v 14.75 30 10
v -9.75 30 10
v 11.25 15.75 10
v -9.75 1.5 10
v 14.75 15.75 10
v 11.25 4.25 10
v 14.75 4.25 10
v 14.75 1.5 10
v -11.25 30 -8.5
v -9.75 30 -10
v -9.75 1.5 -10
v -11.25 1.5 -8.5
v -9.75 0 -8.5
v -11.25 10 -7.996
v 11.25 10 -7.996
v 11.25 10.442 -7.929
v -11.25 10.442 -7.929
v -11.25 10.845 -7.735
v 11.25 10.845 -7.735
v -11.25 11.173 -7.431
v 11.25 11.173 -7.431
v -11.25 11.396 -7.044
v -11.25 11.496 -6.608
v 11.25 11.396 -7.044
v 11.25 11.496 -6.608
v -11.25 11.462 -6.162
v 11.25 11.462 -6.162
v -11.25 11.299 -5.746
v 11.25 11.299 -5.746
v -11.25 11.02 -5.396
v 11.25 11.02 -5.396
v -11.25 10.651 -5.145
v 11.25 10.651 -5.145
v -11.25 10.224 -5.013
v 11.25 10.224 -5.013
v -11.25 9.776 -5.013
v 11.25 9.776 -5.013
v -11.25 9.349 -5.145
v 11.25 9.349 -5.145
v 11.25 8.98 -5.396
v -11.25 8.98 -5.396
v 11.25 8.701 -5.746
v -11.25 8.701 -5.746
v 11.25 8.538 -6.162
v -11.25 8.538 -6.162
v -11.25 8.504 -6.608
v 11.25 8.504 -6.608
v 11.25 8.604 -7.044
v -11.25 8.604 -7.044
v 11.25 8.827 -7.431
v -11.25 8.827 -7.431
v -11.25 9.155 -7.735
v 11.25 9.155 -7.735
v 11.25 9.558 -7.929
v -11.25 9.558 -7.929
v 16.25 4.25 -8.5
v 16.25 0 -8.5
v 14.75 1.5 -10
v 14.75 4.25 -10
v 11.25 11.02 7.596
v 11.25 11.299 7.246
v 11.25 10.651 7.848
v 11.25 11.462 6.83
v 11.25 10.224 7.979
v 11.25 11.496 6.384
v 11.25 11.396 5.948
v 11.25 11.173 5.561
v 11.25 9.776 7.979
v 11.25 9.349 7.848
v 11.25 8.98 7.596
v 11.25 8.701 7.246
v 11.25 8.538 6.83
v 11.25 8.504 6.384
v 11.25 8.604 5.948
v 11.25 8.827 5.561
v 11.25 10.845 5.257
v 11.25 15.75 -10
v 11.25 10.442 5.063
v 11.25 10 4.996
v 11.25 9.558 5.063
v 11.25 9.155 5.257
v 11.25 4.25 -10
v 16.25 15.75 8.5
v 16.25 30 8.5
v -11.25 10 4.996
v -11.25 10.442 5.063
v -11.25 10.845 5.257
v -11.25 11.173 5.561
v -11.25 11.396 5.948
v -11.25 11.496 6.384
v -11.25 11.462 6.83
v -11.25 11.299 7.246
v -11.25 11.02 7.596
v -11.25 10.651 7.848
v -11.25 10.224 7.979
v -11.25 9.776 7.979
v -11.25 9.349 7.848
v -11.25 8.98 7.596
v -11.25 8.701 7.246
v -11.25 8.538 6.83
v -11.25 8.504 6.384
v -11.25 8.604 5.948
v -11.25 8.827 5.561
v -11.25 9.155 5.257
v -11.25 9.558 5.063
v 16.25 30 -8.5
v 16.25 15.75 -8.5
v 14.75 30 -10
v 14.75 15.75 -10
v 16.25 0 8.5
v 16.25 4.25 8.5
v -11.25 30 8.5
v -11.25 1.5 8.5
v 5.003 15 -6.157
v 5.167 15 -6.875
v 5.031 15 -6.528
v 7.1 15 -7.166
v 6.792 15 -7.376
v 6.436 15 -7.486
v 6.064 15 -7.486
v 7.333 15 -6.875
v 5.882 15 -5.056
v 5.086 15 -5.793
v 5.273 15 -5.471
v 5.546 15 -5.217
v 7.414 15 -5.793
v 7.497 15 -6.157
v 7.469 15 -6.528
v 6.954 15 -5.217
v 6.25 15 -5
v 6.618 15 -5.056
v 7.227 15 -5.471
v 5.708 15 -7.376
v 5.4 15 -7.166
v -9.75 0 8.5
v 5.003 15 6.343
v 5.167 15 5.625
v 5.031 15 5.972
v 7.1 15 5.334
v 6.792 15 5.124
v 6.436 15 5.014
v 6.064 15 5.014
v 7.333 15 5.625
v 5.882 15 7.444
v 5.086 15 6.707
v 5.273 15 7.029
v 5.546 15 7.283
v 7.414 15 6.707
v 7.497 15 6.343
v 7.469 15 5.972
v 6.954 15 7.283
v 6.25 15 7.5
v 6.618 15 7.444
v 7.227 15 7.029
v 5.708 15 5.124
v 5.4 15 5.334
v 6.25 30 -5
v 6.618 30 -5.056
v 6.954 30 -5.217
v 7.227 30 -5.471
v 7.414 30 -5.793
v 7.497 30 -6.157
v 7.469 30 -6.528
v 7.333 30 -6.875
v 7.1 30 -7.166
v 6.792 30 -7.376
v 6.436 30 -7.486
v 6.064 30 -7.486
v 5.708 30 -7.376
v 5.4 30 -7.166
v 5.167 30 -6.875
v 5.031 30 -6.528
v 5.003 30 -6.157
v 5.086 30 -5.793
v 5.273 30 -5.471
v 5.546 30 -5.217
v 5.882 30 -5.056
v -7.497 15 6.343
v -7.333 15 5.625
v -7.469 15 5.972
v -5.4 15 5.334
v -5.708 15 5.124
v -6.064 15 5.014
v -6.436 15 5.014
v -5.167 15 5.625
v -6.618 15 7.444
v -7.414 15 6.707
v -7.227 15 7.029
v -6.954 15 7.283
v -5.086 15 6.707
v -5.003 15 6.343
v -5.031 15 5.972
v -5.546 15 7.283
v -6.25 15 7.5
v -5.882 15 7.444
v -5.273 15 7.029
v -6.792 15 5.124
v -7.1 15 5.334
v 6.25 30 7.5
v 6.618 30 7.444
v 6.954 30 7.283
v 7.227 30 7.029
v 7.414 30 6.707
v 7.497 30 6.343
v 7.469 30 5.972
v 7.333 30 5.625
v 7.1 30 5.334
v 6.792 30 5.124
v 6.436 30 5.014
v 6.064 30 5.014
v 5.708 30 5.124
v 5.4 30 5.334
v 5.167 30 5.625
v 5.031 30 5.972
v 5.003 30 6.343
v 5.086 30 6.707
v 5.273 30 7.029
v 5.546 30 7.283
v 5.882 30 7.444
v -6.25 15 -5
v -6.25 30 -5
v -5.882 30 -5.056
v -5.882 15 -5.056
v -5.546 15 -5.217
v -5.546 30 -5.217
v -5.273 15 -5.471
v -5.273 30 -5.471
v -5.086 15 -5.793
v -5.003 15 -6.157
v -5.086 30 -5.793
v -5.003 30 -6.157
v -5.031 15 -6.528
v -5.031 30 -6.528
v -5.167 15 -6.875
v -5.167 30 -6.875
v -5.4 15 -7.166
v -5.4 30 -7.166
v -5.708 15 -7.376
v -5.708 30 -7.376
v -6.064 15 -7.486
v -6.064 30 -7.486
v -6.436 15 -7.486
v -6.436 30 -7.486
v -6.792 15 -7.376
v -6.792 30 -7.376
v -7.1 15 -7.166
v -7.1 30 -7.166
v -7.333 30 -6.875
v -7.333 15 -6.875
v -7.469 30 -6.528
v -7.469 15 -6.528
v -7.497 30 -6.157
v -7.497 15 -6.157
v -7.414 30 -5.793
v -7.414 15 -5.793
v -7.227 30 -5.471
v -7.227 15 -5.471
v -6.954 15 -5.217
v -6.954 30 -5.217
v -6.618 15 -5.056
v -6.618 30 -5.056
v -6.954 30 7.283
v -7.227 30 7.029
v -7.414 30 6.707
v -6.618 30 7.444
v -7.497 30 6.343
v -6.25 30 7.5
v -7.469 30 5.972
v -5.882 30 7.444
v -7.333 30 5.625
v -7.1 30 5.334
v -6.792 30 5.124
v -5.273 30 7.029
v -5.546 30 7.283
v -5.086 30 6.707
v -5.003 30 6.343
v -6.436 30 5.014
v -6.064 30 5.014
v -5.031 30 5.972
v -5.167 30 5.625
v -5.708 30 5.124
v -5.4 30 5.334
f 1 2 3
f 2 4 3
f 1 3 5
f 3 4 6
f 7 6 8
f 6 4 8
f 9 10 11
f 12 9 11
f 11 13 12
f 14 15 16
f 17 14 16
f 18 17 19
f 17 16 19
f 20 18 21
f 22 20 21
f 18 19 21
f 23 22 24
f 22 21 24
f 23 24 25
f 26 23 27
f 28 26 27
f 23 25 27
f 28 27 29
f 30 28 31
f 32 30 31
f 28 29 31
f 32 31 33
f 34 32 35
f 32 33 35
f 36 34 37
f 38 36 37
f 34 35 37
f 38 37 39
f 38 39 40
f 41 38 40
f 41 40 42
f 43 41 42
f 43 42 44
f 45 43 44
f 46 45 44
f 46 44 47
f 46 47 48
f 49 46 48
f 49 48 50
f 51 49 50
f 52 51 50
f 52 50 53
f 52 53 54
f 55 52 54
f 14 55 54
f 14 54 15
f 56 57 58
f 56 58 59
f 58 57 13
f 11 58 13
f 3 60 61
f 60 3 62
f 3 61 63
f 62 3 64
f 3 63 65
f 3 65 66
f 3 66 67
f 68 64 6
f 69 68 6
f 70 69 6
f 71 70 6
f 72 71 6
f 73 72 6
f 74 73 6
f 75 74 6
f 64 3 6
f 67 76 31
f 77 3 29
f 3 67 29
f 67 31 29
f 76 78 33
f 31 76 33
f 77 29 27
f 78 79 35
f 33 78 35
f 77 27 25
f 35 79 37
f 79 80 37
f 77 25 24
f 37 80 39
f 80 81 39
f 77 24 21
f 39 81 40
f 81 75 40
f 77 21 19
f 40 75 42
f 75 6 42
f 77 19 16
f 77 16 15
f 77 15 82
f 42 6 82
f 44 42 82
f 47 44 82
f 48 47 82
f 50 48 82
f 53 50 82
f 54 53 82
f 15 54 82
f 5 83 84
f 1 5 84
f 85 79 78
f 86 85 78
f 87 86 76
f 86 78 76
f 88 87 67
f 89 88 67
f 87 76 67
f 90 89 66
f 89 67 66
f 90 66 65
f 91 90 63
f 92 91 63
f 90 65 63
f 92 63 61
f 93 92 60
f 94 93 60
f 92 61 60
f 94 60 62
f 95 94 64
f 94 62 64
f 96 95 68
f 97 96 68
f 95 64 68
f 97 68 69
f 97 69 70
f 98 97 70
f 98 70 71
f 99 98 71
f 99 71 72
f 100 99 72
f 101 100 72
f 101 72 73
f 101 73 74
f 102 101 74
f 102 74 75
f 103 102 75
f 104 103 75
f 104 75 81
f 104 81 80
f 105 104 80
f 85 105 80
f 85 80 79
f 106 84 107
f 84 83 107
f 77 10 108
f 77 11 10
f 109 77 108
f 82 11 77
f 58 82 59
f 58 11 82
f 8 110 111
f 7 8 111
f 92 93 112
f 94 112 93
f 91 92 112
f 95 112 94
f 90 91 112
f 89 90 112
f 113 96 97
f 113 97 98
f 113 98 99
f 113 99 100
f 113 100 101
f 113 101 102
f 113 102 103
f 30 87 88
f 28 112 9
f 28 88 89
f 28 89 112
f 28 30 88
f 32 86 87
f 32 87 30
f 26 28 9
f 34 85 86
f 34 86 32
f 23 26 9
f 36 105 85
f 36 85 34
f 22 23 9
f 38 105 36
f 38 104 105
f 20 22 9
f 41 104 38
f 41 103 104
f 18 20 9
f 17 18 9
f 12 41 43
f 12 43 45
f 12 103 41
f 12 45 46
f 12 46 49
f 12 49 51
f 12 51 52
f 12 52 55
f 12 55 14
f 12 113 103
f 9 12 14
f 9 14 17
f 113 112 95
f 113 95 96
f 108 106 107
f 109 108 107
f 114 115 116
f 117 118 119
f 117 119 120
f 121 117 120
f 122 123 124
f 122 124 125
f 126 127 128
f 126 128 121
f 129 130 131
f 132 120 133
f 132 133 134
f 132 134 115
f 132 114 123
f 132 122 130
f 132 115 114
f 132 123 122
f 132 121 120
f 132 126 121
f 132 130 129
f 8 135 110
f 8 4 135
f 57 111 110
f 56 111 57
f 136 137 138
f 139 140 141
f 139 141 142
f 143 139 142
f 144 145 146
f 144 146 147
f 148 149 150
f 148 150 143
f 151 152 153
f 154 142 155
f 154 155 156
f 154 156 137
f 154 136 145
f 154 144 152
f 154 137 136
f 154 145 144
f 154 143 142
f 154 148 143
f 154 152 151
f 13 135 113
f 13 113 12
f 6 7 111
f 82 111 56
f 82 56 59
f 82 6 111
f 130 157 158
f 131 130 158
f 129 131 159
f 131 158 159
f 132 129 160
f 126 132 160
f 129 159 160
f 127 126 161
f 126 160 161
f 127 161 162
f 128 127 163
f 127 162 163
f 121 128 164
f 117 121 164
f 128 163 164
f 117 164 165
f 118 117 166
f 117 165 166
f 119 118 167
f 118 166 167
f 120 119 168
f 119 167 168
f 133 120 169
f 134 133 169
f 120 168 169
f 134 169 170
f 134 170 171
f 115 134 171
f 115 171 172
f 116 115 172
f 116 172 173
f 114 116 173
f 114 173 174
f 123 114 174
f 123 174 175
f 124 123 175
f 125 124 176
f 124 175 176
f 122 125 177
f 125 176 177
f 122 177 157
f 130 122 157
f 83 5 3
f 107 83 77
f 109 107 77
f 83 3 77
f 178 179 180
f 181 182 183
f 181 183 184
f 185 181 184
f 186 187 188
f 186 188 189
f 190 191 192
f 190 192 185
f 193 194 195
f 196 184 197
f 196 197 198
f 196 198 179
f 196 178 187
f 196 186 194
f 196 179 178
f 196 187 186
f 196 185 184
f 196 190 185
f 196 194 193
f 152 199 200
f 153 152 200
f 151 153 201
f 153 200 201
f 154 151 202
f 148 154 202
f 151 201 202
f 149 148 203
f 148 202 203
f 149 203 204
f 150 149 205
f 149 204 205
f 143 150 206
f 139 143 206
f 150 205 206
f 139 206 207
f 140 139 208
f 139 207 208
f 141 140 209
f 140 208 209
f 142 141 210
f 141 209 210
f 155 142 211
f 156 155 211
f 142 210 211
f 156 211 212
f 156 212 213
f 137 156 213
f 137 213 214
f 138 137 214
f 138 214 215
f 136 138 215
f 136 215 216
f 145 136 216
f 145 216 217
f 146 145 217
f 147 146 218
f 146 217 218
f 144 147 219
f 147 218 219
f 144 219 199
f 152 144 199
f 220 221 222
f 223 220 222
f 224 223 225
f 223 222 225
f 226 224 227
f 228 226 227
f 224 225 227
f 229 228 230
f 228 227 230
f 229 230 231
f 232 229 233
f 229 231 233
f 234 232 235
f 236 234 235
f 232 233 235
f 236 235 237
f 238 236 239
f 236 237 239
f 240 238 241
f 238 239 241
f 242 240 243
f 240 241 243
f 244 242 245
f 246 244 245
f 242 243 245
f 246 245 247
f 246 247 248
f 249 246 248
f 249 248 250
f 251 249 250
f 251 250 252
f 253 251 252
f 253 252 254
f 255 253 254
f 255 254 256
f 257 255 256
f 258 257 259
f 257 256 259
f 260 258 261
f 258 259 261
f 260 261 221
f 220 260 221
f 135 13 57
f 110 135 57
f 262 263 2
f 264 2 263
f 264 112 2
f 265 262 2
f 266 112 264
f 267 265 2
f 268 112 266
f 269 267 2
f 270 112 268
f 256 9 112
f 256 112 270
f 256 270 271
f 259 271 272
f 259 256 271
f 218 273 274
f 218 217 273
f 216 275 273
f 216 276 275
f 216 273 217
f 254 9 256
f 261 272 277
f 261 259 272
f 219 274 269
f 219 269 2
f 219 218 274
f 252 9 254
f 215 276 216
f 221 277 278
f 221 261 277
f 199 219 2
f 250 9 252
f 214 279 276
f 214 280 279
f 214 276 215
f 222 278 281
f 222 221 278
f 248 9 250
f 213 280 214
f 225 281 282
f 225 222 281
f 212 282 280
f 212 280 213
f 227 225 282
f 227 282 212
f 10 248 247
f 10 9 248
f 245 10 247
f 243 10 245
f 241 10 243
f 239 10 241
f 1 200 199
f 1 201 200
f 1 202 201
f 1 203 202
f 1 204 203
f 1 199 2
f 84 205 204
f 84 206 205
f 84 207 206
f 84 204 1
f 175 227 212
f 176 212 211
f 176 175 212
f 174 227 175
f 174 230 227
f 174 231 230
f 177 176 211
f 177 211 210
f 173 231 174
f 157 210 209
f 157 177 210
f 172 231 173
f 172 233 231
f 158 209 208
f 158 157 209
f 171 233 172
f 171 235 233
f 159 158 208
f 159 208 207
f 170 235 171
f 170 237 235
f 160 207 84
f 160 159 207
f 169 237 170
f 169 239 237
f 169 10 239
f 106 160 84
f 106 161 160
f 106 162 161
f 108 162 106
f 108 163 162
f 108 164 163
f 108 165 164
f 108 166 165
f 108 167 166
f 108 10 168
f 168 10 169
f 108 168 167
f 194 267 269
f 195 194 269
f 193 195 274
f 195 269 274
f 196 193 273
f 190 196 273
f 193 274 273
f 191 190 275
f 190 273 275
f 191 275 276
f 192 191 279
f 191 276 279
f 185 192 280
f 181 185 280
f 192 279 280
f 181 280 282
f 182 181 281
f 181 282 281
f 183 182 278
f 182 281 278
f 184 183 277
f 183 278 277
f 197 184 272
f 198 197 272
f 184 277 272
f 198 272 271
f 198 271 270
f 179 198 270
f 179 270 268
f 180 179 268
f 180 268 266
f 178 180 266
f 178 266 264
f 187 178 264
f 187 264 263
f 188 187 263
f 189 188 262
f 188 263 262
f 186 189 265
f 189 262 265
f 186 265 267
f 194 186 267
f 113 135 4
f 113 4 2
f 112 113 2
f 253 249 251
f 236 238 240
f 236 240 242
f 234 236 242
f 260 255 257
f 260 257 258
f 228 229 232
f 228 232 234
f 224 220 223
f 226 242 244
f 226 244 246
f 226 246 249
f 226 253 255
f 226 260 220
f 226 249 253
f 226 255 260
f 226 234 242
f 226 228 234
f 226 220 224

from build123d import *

# Parameters (mm, degrees)
SKETCH_1_W          = 22.5
SKETCH_1_H          = 20
EXTRUDE_1_DEPTH     = 20
SKETCH_2_W          = 20
SKETCH_2_H          = 4.25
EXTRUDE_2_DEPTH     = 5
SKETCH_3_R          = 1.5
CUT_EXTRUDE_1_DEPTH = 32.721443851
SKETCH_4_W          = 27.5
SKETCH_4_H          = 20
EXTRUDE_3_DEPTH     = 10
SKETCH_5_R          = 1.25
CUT_EXTRUDE_2_DEPTH = 15
CHAMFER_1_SIZE      = 1.5


with BuildPart() as part:
    # 草图1 → 凸台-拉伸1 (new body)
    with BuildSketch(Plane(origin=(0, 0, 0), x_dir=(1, 0, 0), z_dir=(0, 1, 0))):
        Rectangle(SKETCH_1_W, SKETCH_1_H)
    extrude(amount=EXTRUDE_1_DEPTH)

    # 草图2 → 凸台-拉伸2 (add)
    with BuildSketch(Plane(origin=(11.25, 0, 0), x_dir=(0, 0, -1), z_dir=(1, 0, 0))):
        with Locations((0, 17.875)):
            Rectangle(SKETCH_2_W, SKETCH_2_H)
        with Locations((0, 2.125)):
            Rectangle(SKETCH_2_W, SKETCH_2_H)
    extrude(amount=EXTRUDE_2_DEPTH)

    # 草图3 → 切除-拉伸1 (cut, through all)
    with BuildSketch(Plane(origin=(11.25, 0, 0), x_dir=(0, 0, -1), z_dir=(1, 0, 0))):
        with Locations((6.496047989, 10)):
            Circle(SKETCH_3_R)
        with Locations((-6.496047989, 10)):
            Circle(SKETCH_3_R)
    extrude(amount=-CUT_EXTRUDE_1_DEPTH, mode=Mode.SUBTRACT)

    # 草图4 → 凸台-拉伸3 (add)
    with BuildSketch(Plane(origin=(0, 20, 0), x_dir=(1, 0, 0), z_dir=(0, 1, 0))):
        with Locations((2.5, 0)):
            Rectangle(SKETCH_4_W, SKETCH_4_H)
    extrude(amount=EXTRUDE_3_DEPTH)

    # 草图5 → 切除-拉伸2 (cut)
    with BuildSketch(Plane(origin=(0, 30, 0), x_dir=(1, 0, 0), z_dir=(0, 1, 0))):
        with Locations(Location((6.25, 6.25, 0), (0, 0, 270))):
            Circle(SKETCH_5_R)
        with Locations(Location((6.25, -6.25, 0), (0, 0, 270))):
            Circle(SKETCH_5_R)
        with Locations(Location((-6.25, 6.25, 0), (0, 0, 270))):
            Circle(SKETCH_5_R)
        with Locations(Location((-6.25, -6.25, 0), (0, 0, 270))):
            Circle(SKETCH_5_R)
    extrude(amount=-CUT_EXTRUDE_2_DEPTH, mode=Mode.SUBTRACT)

    # 倒角1
    chamfer_1_edges = [part.edges().sort_by_distance(p)[0] for p in [
        (16.25, 22.875, 10),
        (16.25, 22.875, -10),
        (16.25, 2.125, -10),
        (16.25, 2.125, 10),
        (2.5, 0, -10),
        (2.5, 0, 10),
        (-11.25, 0, 0),
        (-11.25, 15, -10),
        (-11.25, 15, 10),
    ]]
    chamfer(chamfer_1_edges, length=CHAMFER_1_SIZE)


solid = part.part
